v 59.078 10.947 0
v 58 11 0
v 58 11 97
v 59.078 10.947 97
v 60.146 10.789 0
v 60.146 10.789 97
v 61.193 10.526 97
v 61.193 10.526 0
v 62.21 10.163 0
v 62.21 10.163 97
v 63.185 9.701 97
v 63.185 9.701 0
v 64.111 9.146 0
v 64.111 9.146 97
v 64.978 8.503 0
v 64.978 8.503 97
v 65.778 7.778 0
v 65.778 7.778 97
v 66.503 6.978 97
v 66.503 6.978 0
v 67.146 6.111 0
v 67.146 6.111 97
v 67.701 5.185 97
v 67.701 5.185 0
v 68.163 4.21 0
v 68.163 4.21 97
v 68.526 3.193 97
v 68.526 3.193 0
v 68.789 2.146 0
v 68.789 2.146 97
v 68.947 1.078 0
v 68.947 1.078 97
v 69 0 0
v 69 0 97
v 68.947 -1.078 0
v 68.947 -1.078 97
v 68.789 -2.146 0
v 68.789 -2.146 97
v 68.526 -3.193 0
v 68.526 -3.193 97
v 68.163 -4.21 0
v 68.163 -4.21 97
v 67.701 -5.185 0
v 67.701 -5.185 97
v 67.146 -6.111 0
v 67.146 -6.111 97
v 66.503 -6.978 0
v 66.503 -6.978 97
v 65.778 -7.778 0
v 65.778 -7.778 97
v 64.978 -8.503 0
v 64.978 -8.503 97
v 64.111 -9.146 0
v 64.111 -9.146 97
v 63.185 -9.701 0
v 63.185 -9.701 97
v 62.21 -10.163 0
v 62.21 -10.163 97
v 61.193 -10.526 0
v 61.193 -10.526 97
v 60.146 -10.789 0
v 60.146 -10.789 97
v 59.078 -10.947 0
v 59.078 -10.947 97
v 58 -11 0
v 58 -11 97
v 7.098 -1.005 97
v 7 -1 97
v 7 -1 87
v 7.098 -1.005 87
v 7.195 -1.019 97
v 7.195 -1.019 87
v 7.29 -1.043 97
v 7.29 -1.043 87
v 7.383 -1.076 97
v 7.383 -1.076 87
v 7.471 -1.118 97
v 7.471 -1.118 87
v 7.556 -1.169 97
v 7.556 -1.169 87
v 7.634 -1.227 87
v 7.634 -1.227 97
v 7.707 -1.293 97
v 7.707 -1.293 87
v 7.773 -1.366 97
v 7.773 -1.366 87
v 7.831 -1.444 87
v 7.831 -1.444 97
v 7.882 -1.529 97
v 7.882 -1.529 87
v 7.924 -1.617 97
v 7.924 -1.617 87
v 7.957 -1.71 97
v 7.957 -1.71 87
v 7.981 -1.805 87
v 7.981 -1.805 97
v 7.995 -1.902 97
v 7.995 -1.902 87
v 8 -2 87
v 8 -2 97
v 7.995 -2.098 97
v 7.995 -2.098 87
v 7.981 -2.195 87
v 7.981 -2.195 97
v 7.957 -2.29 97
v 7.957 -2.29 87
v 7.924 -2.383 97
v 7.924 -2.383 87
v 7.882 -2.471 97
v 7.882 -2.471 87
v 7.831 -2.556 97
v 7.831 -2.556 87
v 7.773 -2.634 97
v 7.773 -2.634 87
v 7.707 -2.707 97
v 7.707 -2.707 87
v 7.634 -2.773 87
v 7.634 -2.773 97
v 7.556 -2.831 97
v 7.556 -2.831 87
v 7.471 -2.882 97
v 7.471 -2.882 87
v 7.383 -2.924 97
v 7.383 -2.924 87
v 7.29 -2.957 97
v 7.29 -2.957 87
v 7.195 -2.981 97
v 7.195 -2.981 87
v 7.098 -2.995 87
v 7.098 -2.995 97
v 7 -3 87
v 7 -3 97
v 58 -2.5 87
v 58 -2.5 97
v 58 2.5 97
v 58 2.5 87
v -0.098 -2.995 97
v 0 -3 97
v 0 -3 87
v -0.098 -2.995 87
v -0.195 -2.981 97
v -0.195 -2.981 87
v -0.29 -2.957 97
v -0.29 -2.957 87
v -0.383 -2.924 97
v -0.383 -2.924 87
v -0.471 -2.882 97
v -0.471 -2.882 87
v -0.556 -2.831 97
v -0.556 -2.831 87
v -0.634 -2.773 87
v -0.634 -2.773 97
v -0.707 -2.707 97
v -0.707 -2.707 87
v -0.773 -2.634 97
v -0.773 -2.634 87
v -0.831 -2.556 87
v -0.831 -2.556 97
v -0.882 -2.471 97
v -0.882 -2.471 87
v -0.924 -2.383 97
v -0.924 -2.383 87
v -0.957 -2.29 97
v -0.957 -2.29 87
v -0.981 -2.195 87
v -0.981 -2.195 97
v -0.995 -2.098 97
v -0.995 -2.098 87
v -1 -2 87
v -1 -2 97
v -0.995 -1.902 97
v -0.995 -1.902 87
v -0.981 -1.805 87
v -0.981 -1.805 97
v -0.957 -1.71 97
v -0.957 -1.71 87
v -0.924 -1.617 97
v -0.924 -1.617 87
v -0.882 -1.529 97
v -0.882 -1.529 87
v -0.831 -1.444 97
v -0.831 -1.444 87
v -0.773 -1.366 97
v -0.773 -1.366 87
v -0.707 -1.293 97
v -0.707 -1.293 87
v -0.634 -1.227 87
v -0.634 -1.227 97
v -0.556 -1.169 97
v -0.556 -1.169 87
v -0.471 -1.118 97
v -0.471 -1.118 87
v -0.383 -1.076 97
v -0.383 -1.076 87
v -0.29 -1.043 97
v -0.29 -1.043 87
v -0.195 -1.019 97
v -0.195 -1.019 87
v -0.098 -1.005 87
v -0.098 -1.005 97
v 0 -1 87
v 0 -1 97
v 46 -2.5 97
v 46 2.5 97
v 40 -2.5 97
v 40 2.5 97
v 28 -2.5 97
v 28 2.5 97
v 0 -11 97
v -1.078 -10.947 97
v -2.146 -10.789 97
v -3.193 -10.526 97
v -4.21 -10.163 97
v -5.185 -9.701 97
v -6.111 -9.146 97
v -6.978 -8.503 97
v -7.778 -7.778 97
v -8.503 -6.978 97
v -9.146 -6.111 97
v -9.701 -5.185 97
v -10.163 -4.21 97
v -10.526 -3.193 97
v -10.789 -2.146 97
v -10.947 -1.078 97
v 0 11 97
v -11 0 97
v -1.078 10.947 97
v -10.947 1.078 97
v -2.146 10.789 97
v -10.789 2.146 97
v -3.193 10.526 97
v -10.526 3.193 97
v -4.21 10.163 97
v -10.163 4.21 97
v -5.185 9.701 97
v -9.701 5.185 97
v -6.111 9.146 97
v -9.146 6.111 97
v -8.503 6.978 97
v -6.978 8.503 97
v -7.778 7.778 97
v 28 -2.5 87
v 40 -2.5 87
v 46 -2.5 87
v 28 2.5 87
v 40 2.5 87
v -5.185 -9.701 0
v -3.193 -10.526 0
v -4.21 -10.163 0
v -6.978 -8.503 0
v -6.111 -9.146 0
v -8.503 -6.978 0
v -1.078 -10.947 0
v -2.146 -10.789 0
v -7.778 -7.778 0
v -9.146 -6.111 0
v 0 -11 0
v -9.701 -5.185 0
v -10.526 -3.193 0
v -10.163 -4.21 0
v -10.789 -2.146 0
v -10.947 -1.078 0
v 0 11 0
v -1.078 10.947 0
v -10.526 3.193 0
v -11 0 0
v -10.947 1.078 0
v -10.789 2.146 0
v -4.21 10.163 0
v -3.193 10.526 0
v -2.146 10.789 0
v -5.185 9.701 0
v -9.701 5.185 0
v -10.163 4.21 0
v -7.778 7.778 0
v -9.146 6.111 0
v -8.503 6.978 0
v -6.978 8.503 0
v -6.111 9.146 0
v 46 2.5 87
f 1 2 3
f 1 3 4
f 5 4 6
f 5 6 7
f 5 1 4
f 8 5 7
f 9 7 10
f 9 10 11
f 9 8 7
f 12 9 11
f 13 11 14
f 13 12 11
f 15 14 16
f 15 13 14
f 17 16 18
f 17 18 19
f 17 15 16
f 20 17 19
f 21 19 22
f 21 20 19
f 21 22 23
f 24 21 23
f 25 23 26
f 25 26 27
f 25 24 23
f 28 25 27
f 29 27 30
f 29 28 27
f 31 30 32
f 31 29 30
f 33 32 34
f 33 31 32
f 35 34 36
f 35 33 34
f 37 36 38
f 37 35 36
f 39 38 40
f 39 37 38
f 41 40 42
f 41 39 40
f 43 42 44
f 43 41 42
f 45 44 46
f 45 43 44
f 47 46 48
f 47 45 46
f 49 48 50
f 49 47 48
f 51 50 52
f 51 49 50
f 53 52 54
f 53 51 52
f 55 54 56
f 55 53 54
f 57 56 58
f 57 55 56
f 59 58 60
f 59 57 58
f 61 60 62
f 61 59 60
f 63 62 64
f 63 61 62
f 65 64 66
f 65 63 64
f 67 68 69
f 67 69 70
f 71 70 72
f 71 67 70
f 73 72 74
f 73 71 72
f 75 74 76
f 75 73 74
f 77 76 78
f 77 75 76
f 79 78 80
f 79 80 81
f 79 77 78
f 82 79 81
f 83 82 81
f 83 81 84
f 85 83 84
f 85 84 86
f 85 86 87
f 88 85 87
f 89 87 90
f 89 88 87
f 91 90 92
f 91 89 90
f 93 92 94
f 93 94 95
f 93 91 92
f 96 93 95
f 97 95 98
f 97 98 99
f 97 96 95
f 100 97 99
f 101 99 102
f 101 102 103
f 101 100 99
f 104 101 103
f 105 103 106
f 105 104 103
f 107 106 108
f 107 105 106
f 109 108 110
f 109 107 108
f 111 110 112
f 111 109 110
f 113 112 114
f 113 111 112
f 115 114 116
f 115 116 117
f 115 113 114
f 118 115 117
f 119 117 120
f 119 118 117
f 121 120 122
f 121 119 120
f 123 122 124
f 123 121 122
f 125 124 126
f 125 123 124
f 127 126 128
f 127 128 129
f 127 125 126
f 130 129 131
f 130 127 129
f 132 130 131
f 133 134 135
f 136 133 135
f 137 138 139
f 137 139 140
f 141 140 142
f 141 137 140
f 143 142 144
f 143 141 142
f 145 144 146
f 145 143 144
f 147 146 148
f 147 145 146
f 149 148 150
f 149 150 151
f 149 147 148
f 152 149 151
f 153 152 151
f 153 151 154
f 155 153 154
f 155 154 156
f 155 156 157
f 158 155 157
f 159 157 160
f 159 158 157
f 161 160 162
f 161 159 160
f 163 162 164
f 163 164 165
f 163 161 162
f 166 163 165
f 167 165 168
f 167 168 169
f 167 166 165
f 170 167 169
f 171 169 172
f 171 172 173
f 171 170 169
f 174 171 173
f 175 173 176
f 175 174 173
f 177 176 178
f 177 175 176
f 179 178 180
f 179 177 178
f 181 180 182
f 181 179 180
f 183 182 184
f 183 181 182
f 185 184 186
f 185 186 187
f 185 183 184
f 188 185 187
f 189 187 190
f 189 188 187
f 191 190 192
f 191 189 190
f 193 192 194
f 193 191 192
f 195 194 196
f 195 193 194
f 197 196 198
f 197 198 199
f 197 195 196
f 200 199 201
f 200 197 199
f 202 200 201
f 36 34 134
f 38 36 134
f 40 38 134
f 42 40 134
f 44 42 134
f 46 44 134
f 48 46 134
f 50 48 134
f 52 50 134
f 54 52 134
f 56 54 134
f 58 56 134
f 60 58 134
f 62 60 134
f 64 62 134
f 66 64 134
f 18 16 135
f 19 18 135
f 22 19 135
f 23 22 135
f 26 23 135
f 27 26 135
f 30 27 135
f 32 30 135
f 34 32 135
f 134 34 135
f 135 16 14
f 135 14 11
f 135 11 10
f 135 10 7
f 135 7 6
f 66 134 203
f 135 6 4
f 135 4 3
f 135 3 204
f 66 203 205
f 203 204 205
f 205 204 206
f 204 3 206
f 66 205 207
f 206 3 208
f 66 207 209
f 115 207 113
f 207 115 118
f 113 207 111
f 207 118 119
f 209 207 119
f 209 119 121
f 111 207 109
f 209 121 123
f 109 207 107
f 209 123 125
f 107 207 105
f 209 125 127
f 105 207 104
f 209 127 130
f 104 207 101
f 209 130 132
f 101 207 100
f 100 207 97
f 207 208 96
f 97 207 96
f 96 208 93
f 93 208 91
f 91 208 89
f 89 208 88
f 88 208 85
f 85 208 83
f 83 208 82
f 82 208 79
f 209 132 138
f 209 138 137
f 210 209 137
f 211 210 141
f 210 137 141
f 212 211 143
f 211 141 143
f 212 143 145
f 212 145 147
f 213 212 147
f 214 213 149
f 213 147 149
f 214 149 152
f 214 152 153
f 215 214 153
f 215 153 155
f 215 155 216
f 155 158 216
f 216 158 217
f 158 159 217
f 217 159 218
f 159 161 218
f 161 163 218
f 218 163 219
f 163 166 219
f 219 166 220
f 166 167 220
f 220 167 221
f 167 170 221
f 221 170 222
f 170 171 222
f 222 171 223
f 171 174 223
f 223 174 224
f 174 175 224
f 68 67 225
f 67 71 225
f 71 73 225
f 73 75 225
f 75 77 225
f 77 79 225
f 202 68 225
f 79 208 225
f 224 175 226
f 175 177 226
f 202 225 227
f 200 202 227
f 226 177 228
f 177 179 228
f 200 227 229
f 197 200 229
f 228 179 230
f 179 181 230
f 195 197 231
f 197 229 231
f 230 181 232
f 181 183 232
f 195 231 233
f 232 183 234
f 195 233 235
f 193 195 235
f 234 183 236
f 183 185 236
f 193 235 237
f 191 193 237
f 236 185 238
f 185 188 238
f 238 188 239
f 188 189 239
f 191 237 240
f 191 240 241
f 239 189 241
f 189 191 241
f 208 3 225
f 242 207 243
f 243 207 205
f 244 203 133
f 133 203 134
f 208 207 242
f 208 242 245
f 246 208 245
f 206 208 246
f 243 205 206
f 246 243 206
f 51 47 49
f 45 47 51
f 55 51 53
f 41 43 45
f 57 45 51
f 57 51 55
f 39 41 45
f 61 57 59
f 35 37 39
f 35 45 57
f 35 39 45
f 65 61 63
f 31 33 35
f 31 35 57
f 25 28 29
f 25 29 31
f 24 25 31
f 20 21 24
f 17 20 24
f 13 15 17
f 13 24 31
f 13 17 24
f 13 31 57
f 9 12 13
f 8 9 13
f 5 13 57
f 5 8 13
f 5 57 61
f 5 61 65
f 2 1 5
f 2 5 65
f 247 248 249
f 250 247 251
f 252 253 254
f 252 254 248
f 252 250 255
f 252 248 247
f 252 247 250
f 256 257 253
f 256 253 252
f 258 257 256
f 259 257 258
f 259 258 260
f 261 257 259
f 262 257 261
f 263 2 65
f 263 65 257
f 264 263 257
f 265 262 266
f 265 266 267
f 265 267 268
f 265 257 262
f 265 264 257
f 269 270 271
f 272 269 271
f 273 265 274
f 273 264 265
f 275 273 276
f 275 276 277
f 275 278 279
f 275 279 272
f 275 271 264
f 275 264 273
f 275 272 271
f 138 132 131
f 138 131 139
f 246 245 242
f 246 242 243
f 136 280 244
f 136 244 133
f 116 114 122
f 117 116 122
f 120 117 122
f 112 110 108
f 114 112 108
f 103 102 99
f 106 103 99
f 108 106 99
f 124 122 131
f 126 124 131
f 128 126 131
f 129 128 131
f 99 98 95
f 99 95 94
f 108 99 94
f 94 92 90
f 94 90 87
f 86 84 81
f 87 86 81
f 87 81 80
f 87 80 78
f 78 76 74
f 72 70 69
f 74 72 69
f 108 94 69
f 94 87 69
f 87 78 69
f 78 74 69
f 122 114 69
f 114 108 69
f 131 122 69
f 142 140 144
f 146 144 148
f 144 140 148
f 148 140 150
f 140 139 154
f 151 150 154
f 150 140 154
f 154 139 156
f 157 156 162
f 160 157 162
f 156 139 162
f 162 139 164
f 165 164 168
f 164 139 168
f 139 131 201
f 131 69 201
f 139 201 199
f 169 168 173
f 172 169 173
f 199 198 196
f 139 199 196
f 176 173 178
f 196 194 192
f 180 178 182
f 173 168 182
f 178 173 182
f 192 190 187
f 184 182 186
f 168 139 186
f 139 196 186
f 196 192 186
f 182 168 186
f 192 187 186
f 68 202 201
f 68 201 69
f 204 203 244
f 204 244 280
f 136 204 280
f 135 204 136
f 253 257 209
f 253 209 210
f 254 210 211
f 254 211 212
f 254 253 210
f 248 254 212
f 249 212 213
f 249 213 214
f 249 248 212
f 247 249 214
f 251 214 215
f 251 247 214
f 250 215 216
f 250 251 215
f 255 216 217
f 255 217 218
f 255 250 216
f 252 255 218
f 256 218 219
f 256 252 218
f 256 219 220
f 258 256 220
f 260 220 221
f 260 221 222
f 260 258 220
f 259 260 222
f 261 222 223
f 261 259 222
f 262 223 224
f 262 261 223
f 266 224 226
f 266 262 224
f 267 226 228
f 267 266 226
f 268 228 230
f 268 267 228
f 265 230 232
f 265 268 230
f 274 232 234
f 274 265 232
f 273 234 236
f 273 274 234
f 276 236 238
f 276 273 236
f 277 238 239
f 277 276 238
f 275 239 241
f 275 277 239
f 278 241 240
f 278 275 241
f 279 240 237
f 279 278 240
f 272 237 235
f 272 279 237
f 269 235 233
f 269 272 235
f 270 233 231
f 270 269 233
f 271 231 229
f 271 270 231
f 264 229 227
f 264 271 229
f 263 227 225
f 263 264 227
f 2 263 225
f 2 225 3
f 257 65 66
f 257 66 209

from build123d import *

# Parameters (mm, degrees)
BOSS_EXTRU_1_DEPTH      = 97
ESQUISSE2_W             = 12
ESQUISSE2_H             = 5
ENL_V_MAT_EXTRU_1_DEPTH = 10


with BuildPart() as part:
    # Esquisse1 → Boss.-Extru.1 (new body)
    with BuildSketch(Plane.XY):
        with BuildLine():
            Line((0, 11), (58, 11))
            ThreePointArc((58, 11), (69, 0), (58, -11))
            Line((58, -11), (0, -11))
            ThreePointArc((0, -11), (-11, 0), (0, 11))
        make_face()
    extrude(amount=BOSS_EXTRU_1_DEPTH)

    # Esquisse2 → Enlèv. mat.-Extru.1 (cut)
    with BuildSketch(Plane.XY.offset(97)):
        with BuildLine():
            Line((0, -1), (7, -1))
            ThreePointArc((7, -1), (8, -2), (7, -3))
            Line((7, -3), (0, -3))
            ThreePointArc((0, -3), (-1, -2), (0, -1))
        make_face()
        with Locations((52, 0)):
            Rectangle(ESQUISSE2_W, ESQUISSE2_H)
        with Locations((34, 0)):
            Rectangle(ESQUISSE2_W, ESQUISSE2_H)
    extrude(amount=-ENL_V_MAT_EXTRU_1_DEPTH, mode=Mode.SUBTRACT)


solid = part.part
